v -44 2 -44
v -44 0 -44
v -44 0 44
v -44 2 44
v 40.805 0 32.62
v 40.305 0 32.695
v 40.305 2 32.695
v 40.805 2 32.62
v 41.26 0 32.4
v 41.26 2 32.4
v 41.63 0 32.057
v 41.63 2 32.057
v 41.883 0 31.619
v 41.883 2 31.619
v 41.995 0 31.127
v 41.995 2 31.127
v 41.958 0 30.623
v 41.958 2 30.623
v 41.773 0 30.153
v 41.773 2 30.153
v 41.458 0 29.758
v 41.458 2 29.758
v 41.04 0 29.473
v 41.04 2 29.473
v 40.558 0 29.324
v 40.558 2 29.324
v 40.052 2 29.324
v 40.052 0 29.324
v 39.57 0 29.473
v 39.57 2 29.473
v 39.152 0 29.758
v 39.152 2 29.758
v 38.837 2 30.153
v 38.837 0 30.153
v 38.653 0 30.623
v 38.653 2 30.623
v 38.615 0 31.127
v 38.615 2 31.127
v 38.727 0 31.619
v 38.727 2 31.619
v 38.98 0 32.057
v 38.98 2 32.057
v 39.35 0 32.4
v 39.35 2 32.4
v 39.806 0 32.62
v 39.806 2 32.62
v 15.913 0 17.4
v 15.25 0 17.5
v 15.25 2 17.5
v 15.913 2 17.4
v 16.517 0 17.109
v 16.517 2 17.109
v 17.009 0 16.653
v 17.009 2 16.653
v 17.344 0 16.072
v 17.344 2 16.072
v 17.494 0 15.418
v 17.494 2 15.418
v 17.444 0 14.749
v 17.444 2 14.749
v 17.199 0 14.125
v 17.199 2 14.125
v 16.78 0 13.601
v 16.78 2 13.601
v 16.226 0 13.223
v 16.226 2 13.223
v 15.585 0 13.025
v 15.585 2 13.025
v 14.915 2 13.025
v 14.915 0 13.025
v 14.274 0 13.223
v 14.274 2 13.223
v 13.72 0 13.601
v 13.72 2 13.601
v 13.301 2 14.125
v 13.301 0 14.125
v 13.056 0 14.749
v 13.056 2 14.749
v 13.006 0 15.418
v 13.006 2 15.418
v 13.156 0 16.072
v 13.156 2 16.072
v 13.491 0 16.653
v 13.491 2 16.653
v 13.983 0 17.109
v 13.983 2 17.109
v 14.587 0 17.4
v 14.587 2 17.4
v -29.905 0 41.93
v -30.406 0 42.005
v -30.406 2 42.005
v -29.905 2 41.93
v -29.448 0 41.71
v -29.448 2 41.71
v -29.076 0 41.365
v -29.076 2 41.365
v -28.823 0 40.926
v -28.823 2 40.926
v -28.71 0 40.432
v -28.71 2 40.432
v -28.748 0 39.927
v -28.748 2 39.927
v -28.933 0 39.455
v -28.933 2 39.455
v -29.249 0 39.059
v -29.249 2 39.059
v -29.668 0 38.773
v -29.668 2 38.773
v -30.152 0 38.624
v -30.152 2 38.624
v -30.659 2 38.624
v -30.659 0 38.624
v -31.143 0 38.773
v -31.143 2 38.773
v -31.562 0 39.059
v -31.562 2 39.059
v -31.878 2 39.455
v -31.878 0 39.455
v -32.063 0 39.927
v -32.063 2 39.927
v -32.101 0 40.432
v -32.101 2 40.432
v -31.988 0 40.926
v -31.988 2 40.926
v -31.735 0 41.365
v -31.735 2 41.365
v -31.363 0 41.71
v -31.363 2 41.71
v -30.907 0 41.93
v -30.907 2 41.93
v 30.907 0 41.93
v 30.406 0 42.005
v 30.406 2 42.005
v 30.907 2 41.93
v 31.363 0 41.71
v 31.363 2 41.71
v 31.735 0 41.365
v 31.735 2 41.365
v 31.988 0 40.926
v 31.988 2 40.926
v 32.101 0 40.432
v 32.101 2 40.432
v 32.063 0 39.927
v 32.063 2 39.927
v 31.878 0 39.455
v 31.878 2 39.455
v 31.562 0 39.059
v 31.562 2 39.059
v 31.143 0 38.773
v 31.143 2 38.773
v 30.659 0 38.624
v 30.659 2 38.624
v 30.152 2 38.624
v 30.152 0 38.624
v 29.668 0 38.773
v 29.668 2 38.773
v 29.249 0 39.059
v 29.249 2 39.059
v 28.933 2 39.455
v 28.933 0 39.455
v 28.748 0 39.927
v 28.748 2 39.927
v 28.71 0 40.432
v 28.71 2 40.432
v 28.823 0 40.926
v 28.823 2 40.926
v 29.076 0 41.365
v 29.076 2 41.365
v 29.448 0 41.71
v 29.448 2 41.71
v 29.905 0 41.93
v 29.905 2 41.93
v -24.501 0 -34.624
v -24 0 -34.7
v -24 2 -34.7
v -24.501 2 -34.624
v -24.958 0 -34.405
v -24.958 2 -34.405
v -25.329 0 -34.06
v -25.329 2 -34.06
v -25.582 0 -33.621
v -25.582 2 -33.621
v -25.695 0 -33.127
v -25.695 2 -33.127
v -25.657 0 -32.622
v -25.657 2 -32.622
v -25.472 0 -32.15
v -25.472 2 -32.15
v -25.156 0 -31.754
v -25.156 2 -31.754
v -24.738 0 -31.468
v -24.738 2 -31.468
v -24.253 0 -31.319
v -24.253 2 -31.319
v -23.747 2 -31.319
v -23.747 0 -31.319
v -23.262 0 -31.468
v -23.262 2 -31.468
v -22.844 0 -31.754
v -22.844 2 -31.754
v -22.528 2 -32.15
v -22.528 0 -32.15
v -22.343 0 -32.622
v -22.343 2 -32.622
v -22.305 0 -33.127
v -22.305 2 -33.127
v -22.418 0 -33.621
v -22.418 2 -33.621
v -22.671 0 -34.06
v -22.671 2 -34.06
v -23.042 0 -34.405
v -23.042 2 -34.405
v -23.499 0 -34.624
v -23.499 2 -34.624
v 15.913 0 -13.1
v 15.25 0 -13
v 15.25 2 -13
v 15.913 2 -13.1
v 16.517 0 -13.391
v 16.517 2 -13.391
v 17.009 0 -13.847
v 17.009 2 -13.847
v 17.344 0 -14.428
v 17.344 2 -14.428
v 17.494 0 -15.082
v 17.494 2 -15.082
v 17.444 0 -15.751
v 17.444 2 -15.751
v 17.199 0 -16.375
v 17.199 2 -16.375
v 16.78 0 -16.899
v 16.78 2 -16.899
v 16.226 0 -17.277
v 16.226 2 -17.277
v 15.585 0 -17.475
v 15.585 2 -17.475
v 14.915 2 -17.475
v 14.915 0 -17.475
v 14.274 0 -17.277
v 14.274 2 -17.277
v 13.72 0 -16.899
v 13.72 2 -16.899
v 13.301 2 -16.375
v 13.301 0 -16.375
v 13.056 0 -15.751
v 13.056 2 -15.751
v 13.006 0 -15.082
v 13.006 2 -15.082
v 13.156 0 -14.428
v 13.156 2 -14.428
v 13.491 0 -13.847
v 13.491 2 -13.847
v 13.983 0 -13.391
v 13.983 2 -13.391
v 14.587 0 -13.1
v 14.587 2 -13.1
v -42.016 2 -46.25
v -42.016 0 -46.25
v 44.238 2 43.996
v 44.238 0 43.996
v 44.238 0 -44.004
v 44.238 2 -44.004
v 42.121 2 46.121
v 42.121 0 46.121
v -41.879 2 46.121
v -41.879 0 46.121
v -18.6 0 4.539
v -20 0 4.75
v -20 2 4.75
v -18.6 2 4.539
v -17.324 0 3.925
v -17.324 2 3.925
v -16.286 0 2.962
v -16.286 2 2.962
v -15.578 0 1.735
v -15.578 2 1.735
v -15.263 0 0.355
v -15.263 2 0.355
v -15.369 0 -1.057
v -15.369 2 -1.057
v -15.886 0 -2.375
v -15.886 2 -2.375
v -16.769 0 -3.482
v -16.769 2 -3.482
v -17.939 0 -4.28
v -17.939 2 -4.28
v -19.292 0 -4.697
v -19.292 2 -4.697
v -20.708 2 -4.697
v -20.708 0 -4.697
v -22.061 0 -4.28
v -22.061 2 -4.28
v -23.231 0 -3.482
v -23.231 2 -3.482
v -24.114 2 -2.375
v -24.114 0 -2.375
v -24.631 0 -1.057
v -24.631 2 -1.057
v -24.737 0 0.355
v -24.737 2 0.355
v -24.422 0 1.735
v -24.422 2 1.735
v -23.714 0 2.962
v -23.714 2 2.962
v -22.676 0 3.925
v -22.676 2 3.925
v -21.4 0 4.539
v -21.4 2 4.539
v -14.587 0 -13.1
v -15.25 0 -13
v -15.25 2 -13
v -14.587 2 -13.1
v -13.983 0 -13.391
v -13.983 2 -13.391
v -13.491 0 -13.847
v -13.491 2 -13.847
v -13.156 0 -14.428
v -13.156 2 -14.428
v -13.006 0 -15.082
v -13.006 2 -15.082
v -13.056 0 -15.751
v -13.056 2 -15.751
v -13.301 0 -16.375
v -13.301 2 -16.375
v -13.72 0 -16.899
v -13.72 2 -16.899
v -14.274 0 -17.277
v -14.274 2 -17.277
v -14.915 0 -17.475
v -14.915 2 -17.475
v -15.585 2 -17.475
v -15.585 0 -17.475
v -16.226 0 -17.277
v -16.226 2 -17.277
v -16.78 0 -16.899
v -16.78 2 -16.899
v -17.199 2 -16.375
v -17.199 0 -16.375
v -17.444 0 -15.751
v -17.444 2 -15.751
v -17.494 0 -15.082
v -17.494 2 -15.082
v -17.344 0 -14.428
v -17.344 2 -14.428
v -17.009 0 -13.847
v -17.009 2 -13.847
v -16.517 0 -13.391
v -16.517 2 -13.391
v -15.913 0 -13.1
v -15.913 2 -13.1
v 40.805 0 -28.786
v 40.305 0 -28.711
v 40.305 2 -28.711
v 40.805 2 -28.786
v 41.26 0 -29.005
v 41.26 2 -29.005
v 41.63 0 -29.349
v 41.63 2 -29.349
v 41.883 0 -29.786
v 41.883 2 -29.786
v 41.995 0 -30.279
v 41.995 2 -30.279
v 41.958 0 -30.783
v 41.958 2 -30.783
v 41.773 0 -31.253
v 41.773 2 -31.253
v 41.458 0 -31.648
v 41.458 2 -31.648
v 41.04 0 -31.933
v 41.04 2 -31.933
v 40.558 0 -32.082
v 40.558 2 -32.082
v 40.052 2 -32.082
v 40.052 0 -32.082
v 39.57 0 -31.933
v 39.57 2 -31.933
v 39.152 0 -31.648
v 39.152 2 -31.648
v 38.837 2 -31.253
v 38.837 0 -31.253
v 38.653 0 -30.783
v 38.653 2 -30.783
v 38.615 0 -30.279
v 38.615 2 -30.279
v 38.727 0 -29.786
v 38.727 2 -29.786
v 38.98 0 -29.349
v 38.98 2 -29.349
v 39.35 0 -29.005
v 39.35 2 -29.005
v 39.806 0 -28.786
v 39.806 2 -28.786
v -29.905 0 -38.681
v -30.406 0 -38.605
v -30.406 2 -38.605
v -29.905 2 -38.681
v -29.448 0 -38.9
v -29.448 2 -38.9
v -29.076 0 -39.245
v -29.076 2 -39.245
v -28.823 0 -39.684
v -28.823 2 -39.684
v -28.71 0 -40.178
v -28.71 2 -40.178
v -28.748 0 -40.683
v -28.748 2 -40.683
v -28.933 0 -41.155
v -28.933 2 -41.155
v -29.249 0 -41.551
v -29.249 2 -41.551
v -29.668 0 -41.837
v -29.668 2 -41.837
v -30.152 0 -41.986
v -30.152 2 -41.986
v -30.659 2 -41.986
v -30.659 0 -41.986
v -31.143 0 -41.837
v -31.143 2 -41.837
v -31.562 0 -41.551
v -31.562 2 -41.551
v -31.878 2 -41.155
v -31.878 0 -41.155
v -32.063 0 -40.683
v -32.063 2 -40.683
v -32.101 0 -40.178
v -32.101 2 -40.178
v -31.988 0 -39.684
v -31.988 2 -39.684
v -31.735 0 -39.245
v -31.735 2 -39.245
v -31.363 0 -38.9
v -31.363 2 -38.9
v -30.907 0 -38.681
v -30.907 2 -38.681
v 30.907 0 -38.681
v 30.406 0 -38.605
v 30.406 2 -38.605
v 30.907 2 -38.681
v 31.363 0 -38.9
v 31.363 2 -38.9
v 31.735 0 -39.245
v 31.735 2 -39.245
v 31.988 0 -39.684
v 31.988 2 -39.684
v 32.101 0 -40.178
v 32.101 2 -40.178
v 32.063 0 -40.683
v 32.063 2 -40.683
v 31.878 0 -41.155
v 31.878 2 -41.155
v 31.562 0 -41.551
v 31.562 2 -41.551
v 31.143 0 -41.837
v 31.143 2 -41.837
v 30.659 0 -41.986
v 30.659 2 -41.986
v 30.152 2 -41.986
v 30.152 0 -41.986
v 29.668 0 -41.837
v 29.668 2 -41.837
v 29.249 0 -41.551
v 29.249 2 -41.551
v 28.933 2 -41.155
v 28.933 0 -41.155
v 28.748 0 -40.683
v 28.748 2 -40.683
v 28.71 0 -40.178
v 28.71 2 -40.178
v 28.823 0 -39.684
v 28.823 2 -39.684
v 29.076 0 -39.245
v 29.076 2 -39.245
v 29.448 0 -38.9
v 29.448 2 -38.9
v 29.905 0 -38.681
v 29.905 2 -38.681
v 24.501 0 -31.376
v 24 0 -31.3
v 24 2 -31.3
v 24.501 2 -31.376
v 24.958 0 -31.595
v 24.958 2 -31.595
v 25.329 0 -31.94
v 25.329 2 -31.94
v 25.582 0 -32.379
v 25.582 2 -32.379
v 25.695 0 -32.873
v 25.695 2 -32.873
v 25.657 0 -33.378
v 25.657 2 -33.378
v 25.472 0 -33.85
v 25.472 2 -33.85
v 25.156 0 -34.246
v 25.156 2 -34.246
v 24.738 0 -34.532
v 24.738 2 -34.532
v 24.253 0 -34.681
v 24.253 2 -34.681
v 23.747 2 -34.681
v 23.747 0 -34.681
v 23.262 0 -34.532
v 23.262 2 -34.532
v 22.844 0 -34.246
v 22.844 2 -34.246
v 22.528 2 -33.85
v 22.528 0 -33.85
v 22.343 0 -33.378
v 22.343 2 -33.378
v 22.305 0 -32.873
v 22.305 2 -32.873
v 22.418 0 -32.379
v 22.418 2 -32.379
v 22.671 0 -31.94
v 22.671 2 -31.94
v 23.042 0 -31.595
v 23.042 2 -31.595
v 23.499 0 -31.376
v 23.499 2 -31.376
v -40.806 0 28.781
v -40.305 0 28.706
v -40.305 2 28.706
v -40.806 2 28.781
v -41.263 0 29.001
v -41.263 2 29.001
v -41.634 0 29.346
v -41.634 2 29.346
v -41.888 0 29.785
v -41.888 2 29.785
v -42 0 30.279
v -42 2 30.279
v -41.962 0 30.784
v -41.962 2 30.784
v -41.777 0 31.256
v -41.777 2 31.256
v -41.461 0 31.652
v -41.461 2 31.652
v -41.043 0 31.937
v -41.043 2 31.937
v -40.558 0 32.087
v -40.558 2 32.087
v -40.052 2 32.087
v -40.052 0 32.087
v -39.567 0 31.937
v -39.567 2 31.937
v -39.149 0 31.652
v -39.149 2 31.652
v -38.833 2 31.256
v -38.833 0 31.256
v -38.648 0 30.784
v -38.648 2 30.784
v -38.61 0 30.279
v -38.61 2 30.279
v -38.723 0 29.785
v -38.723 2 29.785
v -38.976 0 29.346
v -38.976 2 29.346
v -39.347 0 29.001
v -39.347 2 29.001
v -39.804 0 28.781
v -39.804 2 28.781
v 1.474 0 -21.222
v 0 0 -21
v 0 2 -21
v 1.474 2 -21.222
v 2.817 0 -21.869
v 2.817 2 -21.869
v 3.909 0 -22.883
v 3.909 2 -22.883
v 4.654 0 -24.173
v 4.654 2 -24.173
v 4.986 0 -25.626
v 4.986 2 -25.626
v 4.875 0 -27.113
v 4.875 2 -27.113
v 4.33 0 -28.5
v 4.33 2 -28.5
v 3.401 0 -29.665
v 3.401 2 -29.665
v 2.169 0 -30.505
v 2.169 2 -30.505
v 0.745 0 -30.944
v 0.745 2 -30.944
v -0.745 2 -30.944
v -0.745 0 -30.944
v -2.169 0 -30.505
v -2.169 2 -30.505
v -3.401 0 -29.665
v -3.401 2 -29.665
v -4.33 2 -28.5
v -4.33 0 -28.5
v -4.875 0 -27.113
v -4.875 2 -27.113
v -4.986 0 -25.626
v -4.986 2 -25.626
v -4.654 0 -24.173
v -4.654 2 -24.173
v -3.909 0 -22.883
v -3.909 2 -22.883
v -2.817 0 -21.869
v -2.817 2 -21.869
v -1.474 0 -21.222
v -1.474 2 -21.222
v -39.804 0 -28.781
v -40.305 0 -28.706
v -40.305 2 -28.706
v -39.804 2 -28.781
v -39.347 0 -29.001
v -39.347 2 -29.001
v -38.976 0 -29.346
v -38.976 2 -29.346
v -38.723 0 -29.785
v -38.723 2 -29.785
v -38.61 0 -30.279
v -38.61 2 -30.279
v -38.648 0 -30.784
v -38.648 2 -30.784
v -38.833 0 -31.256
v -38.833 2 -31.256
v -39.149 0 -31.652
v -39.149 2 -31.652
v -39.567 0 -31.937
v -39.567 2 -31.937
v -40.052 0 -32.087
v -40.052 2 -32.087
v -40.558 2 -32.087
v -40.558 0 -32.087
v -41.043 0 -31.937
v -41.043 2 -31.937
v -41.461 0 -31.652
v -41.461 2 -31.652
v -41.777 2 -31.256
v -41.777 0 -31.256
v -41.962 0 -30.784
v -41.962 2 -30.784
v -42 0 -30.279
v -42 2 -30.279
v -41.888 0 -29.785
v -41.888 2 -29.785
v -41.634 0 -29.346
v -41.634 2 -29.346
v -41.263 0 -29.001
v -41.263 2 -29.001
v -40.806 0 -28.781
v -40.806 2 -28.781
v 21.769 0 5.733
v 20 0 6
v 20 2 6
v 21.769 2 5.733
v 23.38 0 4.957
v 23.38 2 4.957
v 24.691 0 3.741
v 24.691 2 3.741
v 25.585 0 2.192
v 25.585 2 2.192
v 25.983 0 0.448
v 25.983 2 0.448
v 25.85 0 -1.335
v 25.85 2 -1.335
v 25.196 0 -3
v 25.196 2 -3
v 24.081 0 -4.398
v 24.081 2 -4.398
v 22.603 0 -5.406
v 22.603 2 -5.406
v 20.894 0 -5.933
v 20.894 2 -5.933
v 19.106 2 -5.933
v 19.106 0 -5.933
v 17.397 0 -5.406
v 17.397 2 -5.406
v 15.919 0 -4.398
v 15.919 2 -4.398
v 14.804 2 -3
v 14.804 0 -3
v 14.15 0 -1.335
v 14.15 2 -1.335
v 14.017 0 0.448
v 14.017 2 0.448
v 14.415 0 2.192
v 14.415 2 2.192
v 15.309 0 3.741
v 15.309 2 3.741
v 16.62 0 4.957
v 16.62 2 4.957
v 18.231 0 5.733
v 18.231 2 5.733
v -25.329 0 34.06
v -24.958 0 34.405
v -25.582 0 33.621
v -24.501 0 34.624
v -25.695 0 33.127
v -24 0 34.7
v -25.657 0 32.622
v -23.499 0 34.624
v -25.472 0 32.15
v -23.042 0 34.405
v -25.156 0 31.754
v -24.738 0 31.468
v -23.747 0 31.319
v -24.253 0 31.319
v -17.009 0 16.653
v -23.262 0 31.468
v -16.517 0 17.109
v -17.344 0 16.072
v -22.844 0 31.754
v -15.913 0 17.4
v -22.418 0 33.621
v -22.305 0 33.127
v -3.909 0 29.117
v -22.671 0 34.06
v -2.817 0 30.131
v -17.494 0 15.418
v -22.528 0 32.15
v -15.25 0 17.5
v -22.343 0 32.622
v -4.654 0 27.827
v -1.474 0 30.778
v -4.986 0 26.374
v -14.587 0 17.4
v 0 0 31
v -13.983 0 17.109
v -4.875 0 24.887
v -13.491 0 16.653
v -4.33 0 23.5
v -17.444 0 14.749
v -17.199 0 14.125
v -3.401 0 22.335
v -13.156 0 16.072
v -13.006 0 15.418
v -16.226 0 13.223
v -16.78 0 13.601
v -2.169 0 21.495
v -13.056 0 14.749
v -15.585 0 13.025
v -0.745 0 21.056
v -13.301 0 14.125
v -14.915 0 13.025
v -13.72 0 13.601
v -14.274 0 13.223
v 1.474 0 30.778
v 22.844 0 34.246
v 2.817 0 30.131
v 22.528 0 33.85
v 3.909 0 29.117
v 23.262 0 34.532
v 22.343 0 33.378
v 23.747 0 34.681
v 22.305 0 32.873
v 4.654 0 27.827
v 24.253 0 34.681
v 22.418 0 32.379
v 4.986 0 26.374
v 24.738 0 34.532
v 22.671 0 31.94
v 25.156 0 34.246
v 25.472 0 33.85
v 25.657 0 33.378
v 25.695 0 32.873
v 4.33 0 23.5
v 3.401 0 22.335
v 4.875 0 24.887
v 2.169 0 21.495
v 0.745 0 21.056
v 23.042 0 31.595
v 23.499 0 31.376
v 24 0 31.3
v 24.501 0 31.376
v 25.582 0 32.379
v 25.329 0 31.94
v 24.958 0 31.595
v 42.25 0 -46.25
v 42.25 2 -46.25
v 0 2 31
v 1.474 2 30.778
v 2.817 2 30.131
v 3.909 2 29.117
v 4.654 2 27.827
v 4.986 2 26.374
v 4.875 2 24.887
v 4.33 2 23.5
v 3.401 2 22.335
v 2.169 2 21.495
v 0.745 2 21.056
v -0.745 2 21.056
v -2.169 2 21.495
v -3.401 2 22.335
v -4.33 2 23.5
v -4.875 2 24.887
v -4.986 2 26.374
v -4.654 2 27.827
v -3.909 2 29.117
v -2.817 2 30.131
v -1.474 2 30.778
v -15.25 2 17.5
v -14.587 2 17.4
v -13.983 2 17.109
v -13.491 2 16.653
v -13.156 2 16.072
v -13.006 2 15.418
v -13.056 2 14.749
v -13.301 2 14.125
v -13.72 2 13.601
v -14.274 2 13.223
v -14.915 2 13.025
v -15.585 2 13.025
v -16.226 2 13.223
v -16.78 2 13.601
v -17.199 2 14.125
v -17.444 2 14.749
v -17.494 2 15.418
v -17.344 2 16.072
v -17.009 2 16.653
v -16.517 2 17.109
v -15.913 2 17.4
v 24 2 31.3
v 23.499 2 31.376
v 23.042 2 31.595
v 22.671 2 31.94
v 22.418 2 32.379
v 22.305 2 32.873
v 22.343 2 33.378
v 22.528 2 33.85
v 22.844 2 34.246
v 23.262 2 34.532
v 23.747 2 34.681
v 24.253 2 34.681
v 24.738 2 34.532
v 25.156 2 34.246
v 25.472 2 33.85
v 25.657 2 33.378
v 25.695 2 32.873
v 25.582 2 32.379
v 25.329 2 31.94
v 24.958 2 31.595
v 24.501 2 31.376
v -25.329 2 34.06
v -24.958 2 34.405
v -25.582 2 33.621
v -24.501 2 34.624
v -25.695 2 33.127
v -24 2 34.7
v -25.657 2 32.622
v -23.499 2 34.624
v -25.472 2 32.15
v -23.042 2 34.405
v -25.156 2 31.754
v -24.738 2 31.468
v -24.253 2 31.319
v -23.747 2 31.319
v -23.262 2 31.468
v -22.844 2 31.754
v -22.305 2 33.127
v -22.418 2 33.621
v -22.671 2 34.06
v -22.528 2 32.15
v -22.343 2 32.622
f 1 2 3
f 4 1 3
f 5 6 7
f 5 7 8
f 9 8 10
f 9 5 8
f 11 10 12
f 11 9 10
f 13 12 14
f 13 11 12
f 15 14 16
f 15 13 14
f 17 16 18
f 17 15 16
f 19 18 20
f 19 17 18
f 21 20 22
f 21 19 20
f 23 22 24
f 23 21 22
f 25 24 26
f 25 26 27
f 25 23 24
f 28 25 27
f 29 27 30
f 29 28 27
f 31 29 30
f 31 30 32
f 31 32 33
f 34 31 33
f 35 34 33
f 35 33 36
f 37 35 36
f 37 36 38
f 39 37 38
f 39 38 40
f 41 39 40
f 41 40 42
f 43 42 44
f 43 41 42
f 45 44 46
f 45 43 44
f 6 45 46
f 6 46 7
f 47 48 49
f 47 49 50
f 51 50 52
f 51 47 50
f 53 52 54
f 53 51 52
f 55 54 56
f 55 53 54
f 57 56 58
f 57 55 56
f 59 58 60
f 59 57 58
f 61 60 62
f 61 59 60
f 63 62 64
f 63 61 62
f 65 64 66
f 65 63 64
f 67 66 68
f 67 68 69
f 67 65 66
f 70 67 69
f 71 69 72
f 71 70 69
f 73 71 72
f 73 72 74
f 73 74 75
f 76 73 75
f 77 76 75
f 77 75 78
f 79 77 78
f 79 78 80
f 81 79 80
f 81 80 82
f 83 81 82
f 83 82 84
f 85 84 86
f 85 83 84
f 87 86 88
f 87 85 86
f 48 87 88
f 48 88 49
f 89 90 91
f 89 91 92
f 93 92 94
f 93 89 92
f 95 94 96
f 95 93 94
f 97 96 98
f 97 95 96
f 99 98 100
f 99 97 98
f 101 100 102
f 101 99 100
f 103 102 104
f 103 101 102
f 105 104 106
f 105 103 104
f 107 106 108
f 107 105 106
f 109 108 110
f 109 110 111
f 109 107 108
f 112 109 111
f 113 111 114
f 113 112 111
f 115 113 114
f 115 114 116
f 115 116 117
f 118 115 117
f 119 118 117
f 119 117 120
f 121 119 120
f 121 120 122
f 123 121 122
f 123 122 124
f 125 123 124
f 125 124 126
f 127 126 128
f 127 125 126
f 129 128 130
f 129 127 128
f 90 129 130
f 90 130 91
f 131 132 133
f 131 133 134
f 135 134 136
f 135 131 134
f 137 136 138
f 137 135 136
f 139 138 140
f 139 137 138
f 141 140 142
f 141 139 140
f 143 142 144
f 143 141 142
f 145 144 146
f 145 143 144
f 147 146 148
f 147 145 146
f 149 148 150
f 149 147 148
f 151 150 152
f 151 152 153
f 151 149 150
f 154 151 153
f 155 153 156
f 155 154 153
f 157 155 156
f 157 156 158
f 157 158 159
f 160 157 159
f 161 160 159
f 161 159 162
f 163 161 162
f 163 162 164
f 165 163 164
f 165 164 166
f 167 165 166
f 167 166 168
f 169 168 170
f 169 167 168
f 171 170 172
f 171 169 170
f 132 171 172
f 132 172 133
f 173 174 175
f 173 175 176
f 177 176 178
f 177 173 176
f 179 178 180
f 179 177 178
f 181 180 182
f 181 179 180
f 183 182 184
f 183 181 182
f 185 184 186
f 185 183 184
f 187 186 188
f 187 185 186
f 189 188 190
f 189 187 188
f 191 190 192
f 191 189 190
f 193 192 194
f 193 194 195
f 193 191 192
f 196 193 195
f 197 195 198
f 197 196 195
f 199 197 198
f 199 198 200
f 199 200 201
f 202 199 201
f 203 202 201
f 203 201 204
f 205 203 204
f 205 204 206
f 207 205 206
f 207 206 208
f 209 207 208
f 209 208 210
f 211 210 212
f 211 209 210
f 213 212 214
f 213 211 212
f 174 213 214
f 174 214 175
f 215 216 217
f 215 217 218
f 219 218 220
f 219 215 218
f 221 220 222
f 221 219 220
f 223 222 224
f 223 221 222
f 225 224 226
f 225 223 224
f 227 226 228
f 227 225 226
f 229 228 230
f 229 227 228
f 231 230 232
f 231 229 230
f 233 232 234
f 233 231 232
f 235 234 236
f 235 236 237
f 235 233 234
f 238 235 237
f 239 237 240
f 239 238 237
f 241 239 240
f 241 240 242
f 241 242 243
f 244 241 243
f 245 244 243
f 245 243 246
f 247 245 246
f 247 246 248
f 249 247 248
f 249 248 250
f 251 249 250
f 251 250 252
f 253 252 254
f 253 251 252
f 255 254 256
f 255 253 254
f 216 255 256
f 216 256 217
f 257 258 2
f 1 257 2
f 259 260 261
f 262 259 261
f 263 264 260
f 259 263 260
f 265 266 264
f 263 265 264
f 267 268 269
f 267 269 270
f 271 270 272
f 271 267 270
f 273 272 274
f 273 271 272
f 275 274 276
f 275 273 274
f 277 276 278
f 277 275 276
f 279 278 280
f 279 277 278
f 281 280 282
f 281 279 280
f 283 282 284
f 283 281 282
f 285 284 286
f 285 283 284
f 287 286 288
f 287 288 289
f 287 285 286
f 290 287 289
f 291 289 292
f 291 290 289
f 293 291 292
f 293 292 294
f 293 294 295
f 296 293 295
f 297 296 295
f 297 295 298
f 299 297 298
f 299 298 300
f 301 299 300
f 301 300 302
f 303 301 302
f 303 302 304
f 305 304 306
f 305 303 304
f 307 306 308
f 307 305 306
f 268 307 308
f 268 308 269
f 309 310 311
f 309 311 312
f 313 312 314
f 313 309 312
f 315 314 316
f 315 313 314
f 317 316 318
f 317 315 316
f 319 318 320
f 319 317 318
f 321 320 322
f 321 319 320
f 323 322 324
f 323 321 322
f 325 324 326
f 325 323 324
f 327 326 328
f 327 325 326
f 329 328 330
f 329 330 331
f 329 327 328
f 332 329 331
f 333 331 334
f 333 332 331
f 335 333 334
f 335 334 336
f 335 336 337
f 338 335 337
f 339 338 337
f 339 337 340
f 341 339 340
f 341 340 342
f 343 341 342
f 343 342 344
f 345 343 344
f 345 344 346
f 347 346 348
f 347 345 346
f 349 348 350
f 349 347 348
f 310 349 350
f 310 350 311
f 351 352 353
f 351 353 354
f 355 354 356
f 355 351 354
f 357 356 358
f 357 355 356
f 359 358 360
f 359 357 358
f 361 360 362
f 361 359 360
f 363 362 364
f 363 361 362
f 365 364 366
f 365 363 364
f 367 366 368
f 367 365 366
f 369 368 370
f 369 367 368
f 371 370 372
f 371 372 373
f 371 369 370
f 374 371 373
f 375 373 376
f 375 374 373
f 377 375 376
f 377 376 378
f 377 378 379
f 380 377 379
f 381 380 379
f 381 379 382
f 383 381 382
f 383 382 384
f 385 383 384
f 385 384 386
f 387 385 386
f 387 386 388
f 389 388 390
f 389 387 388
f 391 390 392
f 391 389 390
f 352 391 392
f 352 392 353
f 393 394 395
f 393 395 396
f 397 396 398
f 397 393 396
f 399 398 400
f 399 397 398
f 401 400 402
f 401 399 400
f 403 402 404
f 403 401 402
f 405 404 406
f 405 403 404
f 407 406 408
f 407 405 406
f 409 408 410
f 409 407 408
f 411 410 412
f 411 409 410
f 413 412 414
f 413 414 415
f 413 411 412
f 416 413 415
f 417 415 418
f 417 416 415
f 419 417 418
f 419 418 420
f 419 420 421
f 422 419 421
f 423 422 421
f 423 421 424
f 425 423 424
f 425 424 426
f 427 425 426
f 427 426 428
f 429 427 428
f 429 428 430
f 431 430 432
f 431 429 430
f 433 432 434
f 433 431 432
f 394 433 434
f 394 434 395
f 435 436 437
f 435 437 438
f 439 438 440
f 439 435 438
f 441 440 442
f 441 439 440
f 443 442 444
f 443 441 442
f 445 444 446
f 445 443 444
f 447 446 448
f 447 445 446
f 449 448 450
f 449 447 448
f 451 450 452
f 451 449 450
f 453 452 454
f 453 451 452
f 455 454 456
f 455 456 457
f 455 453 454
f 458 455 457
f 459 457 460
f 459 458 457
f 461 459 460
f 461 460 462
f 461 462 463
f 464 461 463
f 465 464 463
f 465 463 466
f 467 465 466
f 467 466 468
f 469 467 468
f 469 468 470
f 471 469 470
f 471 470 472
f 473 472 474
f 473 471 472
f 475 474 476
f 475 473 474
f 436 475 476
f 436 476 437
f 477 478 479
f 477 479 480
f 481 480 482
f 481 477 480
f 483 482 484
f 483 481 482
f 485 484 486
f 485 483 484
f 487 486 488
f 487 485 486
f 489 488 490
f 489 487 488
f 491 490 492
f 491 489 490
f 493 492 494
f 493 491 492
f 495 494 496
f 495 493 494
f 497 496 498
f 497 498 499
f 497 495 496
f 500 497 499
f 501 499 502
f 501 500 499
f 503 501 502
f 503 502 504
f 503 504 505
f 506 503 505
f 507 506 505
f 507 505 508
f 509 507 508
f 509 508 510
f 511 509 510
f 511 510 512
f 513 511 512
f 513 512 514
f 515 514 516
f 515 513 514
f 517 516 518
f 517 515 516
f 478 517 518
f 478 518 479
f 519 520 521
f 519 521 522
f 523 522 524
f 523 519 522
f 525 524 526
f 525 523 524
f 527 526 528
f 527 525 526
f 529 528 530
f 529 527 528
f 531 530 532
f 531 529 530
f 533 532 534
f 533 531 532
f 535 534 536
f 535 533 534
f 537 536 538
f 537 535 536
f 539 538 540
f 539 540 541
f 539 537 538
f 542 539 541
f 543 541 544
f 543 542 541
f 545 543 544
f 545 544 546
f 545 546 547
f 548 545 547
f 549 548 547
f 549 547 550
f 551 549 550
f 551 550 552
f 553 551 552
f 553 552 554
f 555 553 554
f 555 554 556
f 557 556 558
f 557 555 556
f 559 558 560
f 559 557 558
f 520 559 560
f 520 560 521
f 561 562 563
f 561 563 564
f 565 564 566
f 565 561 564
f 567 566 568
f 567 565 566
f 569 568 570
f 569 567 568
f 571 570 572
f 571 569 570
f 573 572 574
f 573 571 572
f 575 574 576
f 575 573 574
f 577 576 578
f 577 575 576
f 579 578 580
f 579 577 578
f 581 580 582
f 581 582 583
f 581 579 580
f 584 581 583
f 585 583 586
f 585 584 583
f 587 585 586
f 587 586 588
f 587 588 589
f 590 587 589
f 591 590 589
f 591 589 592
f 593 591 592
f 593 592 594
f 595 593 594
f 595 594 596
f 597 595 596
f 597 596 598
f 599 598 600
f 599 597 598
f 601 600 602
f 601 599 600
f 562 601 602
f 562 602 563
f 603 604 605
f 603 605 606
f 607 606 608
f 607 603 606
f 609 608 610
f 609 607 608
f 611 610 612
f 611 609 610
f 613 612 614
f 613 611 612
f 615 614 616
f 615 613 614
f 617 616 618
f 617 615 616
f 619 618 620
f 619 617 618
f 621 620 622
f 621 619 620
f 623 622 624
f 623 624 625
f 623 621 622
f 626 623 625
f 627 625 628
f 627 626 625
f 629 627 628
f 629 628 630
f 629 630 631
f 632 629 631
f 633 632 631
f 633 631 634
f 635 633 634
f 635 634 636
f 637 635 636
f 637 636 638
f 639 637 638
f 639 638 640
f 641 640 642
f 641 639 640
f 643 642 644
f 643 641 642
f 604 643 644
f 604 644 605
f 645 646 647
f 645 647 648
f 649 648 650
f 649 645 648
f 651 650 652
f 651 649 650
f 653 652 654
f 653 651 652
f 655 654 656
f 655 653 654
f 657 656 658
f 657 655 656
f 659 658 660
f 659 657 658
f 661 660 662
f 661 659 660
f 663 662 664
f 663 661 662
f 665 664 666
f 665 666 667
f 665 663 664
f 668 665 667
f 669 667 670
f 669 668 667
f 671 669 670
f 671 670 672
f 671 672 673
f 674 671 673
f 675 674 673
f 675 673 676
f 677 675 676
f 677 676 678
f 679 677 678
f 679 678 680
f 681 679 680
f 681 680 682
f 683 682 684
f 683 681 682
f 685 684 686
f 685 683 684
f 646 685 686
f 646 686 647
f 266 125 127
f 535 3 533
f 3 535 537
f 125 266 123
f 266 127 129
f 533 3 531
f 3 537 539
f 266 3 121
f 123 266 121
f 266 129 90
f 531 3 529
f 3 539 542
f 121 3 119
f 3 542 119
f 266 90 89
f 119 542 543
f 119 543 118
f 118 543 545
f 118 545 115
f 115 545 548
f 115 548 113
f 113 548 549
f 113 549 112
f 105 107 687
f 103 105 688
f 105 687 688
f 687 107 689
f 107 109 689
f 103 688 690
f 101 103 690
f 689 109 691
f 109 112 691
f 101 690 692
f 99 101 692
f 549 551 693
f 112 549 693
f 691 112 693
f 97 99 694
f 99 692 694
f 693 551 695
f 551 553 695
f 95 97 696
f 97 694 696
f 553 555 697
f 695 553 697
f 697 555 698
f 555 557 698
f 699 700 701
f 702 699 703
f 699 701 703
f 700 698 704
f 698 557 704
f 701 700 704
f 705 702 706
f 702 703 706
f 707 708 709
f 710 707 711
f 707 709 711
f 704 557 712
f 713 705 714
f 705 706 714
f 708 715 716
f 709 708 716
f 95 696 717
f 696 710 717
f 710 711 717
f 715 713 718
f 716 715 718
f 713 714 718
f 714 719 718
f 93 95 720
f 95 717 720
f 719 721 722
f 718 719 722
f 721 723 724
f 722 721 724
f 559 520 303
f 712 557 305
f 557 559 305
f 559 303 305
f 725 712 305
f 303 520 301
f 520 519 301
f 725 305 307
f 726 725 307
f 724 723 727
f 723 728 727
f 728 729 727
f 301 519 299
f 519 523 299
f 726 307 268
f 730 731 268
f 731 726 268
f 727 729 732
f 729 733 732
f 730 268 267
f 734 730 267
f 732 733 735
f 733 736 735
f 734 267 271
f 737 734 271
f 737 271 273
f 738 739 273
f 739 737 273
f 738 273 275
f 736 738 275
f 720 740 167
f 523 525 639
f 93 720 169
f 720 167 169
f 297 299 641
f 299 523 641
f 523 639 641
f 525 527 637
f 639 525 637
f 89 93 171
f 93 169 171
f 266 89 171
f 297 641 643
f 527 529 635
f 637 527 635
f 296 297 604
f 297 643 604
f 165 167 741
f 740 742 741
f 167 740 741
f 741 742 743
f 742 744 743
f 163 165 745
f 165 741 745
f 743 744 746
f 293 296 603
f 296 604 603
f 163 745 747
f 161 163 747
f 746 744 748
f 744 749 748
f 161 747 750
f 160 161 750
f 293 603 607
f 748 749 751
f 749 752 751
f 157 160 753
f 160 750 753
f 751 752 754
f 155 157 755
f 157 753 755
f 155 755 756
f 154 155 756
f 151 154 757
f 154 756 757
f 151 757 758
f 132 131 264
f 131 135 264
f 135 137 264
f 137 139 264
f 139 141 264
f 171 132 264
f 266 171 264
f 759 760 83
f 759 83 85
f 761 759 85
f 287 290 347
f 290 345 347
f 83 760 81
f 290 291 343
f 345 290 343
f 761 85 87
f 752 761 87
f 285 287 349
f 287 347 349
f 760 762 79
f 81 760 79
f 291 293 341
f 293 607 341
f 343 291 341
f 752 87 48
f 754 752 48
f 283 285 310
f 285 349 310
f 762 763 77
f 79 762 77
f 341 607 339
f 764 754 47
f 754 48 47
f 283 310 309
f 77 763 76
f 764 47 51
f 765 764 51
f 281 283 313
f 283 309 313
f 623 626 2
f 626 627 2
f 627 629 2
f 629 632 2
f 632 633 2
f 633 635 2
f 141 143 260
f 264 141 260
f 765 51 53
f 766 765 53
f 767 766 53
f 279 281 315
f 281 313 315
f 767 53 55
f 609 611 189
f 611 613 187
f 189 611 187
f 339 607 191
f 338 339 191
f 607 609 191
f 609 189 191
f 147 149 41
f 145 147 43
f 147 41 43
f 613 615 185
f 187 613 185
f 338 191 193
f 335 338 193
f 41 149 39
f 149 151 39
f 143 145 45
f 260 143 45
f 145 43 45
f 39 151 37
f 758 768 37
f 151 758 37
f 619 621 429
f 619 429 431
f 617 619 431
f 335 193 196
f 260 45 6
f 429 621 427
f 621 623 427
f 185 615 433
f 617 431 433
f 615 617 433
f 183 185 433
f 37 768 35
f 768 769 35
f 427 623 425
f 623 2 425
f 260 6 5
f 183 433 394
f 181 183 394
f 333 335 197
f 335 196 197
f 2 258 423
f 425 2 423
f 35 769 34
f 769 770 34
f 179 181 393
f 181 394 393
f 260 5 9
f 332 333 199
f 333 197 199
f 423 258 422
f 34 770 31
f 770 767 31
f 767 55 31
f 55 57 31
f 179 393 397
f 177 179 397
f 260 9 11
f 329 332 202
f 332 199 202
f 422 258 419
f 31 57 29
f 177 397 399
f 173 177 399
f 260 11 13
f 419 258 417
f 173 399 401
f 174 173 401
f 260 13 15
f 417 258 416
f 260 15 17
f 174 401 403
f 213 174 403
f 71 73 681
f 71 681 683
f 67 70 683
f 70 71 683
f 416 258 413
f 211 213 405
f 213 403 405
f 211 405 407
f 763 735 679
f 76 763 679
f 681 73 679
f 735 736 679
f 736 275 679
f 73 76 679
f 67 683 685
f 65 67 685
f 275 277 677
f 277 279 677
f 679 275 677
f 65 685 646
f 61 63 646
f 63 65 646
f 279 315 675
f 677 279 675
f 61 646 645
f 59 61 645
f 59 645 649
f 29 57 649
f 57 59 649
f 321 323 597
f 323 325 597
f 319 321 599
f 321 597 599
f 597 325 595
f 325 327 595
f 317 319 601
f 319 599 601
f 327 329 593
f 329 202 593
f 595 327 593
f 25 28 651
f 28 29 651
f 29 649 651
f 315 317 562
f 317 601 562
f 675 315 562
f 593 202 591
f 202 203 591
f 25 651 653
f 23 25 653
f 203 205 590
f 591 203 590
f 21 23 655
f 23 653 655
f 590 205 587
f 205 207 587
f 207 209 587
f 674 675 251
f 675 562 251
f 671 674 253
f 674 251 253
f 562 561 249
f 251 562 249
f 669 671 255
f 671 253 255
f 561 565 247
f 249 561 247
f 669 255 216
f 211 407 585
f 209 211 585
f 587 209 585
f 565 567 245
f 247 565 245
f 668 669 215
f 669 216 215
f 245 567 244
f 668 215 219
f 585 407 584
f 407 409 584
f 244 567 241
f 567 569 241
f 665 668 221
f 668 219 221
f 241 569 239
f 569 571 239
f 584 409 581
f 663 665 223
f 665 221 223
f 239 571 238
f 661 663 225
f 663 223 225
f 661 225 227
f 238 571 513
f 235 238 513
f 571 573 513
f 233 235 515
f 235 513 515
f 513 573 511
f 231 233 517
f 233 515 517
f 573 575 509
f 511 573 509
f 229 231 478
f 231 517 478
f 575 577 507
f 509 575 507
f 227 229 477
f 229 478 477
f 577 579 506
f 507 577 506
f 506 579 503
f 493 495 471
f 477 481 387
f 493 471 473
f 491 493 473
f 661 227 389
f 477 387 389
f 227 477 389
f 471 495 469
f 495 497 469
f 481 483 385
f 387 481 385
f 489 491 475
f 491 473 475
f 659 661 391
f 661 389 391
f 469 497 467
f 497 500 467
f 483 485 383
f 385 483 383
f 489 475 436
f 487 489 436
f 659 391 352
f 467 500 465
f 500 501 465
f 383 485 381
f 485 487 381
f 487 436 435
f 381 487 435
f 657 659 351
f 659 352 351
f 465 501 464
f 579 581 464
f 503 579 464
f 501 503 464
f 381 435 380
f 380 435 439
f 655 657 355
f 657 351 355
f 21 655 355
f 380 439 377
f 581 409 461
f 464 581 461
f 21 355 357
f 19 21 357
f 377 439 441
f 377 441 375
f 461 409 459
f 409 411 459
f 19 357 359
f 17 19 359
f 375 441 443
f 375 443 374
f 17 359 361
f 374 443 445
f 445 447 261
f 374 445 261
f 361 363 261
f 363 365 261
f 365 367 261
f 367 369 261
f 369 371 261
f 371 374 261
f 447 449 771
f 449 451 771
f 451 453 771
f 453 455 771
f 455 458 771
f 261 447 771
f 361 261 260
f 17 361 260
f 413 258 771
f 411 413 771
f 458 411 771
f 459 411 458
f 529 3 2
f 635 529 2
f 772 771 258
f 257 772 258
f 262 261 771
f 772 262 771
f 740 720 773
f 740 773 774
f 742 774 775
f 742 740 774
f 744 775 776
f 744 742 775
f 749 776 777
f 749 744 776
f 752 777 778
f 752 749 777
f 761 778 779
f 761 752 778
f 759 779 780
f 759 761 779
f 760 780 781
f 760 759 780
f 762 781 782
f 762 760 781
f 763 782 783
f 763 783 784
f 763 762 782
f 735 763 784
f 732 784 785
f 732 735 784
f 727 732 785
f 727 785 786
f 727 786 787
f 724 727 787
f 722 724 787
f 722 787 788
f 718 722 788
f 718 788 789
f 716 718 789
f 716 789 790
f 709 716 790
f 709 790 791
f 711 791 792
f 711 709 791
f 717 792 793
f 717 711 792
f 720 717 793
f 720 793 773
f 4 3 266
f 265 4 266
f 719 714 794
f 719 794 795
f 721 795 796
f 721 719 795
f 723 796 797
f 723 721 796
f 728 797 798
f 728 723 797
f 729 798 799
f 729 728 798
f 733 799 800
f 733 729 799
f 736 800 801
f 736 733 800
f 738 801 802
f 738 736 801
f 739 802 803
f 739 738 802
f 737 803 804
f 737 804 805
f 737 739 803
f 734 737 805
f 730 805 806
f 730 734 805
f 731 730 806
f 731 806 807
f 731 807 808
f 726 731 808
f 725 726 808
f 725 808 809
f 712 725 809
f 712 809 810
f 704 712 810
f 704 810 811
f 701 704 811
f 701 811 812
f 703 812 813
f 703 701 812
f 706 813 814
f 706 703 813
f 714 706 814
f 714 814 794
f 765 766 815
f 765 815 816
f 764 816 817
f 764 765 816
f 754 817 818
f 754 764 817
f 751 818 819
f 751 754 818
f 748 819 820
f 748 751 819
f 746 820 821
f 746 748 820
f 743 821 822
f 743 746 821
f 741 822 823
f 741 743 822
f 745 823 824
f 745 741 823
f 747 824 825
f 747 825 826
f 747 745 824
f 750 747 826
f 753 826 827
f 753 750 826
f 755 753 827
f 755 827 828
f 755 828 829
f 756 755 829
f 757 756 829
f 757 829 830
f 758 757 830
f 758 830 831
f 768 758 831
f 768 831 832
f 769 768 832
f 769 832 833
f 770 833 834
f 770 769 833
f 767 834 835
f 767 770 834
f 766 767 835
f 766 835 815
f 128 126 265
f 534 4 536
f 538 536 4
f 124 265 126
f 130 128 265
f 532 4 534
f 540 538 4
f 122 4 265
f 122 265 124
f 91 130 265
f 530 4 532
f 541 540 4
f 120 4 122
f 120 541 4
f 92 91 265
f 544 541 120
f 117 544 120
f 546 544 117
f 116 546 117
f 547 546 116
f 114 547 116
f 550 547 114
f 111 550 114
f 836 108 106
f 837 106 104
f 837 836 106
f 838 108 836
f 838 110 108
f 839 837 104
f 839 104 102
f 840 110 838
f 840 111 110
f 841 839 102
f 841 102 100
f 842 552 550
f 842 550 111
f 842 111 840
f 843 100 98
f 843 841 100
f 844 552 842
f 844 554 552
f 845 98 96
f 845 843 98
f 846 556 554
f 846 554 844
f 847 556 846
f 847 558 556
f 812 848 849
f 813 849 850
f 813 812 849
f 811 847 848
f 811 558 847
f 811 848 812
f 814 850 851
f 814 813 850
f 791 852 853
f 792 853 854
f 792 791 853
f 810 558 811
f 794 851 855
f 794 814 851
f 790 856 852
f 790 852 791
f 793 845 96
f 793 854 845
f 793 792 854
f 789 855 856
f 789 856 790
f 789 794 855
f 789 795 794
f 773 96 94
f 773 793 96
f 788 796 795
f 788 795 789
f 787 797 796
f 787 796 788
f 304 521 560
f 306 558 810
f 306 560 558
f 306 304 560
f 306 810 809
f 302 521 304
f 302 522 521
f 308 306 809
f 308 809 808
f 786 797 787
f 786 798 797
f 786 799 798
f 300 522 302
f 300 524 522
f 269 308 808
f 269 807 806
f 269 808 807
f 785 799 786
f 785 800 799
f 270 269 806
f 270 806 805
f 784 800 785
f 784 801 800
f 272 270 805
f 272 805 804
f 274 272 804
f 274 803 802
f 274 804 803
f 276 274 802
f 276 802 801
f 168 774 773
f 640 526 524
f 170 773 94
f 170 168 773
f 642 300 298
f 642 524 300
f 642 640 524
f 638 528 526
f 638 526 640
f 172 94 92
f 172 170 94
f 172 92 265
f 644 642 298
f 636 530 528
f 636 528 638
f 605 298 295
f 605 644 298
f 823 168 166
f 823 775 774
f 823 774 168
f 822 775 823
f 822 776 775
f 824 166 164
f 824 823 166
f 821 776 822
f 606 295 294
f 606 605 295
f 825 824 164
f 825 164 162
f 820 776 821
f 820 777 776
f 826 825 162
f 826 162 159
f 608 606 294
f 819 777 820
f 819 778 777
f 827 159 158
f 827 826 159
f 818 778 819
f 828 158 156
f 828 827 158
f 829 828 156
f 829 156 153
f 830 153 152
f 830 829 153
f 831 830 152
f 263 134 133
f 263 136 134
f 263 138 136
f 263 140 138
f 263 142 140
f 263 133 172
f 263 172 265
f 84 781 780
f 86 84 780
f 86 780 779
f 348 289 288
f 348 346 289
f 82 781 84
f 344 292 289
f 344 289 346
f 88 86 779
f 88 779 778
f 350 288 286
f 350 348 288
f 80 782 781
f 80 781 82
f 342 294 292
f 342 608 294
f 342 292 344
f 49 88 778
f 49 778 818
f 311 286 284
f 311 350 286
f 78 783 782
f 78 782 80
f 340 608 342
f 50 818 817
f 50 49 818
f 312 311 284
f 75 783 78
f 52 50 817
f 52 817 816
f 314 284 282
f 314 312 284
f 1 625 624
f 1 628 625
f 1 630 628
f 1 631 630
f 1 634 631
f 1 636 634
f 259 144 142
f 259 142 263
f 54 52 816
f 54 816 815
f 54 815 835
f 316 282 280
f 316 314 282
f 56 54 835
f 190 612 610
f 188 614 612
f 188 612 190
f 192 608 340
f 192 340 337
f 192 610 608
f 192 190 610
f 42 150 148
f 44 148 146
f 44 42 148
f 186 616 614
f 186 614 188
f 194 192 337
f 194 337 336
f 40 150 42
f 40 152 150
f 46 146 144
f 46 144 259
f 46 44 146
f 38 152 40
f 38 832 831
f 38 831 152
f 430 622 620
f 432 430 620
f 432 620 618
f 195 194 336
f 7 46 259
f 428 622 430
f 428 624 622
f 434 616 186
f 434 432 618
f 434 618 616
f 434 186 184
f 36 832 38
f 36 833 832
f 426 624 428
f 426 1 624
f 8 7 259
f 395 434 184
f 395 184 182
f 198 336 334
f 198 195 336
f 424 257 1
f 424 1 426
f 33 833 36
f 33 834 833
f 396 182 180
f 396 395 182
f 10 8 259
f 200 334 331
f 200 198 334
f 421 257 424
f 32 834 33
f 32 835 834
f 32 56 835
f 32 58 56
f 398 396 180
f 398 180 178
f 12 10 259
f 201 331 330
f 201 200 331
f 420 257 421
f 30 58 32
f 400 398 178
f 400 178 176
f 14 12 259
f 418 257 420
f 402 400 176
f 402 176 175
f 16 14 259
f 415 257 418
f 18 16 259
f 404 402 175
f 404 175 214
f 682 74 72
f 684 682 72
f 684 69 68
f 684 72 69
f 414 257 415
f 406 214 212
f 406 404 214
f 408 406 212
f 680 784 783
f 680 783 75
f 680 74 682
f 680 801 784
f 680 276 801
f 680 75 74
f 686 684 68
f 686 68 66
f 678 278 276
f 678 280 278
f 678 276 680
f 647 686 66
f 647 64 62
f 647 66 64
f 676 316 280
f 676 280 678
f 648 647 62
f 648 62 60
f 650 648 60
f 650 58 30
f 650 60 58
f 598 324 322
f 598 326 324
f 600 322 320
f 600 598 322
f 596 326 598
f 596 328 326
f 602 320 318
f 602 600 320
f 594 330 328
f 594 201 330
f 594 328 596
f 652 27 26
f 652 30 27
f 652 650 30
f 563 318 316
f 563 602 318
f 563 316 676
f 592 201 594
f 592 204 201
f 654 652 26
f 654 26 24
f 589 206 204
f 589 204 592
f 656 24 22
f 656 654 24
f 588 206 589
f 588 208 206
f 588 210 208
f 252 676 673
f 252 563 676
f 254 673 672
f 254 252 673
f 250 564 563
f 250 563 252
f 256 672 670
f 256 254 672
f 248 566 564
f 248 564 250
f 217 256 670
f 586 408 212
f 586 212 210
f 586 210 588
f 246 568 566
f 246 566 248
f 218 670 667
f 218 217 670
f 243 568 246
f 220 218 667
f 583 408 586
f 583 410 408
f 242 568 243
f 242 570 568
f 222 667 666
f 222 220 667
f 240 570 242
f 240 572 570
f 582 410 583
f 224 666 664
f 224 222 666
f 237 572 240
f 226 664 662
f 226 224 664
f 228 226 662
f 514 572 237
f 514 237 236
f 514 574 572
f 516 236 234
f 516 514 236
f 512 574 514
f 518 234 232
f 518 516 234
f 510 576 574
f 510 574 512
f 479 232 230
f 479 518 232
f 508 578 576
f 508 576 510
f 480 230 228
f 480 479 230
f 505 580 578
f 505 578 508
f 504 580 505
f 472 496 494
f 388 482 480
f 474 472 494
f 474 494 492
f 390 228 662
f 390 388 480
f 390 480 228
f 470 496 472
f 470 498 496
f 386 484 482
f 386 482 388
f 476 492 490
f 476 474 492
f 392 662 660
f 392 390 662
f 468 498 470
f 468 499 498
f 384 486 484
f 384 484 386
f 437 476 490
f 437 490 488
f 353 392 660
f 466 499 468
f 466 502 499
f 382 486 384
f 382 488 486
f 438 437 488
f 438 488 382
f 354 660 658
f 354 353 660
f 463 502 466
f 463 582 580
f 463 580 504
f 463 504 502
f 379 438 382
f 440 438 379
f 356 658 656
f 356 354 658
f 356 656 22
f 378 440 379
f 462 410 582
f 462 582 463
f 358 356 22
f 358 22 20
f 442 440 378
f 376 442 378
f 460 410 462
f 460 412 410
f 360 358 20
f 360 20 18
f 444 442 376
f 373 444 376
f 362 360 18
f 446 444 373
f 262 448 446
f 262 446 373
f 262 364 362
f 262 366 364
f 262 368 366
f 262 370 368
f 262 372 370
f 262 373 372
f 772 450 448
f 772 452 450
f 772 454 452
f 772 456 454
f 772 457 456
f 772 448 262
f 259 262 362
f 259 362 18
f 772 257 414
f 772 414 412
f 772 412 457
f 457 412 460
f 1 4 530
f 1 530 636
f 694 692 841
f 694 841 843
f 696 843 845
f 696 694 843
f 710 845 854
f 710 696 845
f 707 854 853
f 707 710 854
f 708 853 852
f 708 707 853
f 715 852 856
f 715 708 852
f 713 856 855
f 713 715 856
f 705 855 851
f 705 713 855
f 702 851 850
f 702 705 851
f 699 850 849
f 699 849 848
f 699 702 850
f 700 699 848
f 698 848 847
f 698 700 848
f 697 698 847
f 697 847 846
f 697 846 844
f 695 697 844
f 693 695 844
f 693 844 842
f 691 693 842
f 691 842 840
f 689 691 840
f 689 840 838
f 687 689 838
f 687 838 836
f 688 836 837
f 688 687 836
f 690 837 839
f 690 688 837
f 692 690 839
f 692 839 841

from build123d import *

# Parameters (mm, degrees)
SKETCH_1_R      = 2.25
SKETCH_1_R_2    = 1.7
SKETCH_1_R_3    = 6
SKETCH_1_R_4    = 4.75
SKETCH_1_R_5    = 5
SKETCH_1_R_6    = 1.69491354
EXTRUDE_1_DEPTH = 2


with BuildPart() as part:
    # 草图1 → 凸台-拉伸1 (new body)
    with BuildSketch(Plane(origin=(0, 0, 0), x_dir=(1, 0, 0), z_dir=(0, 1, 0))):
        Polygon((-41.878679656, -46.121320344), (42.121320344, -46.121320344), (44.23849367, -43.995861074), (44.23849367, 44.004138926), (42.249509012, 46.250010702), (-42.015698652, 46.250010702), (-44, 44), (-44, -44), align=None)
        with Locations(Location((-15.25, -15.25, 0), (0, 0, 270))):
            Circle(SKETCH_1_R, mode=Mode.SUBTRACT)
        with Locations(Location((-15.25, 15.25, 0), (0, 0, 270))):
            Circle(SKETCH_1_R, mode=Mode.SUBTRACT)
        with Locations(Location((15.25, -15.25, 0), (0, 0, 270))):
            Circle(SKETCH_1_R, mode=Mode.SUBTRACT)
        with Locations(Location((15.25, 15.25, 0), (0, 0, 270))):
            Circle(SKETCH_1_R, mode=Mode.SUBTRACT)
        with Locations(Location((-24, -33, 0), (0, 0, 270))):
            Circle(SKETCH_1_R_2, mode=Mode.SUBTRACT)
        with Locations(Location((20, 0, 0), (0, 0, 270))):
            Circle(SKETCH_1_R_3, mode=Mode.SUBTRACT)
        with Locations(Location((-20, 0, 0), (0, 0, 270))):
            Circle(SKETCH_1_R_4, mode=Mode.SUBTRACT)
        with Locations(Location((0, 26, 0), (0, 0, 270))):
            Circle(SKETCH_1_R_5, mode=Mode.SUBTRACT)
        with Locations(Location((0, -26, 0), (0, 0, 270))):
            Circle(SKETCH_1_R_5, mode=Mode.SUBTRACT)
        with Locations(Location((-30.40559154, -40.30508646, 0), (0, 0, 270))):
            Circle(SKETCH_1_R_2, mode=Mode.SUBTRACT)
        with Locations(Location((-30.40559154, 40.30508646, 0), (0, 0, 270))):
            Circle(SKETCH_1_R_2, mode=Mode.SUBTRACT)
        with Locations(Location((-40.30508646, 30.40559154, 0), (0, 0, 270))):
            Circle(SKETCH_1_R_2, mode=Mode.SUBTRACT)
        with Locations(Location((30.40559154, -40.30508646, 0), (0, 0, 270))):
            Circle(SKETCH_1_R_2, mode=Mode.SUBTRACT)
        with Locations(Location((40.30508646, -31, 0), (0, 0, 270))):
            Circle(SKETCH_1_R_6, mode=Mode.SUBTRACT)
        with Locations(Location((40.30508646, 30.40559154, 0), (0, 0, 270))):
            Circle(SKETCH_1_R_6, mode=Mode.SUBTRACT)
        with Locations(Location((30.40559154, 40.30508646, 0), (0, 0, 270))):
            Circle(SKETCH_1_R_2, mode=Mode.SUBTRACT)
        with Locations(Location((-40.30508646, -30.40559154, 0), (0, 0, 90))):
            Circle(SKETCH_1_R_2, mode=Mode.SUBTRACT)
        with Locations(Location((24, -33, 0), (0, 0, 90))):
            Circle(SKETCH_1_R_2, mode=Mode.SUBTRACT)
        with Locations(Location((24, 33, 0), (0, 0, 270))):
            Circle(SKETCH_1_R_2, mode=Mode.SUBTRACT)
        with Locations(Location((-24, 33, 0), (0, 0, 90))):
            Circle(SKETCH_1_R_2, mode=Mode.SUBTRACT)
    extrude(amount=EXTRUDE_1_DEPTH)


solid = part.part
